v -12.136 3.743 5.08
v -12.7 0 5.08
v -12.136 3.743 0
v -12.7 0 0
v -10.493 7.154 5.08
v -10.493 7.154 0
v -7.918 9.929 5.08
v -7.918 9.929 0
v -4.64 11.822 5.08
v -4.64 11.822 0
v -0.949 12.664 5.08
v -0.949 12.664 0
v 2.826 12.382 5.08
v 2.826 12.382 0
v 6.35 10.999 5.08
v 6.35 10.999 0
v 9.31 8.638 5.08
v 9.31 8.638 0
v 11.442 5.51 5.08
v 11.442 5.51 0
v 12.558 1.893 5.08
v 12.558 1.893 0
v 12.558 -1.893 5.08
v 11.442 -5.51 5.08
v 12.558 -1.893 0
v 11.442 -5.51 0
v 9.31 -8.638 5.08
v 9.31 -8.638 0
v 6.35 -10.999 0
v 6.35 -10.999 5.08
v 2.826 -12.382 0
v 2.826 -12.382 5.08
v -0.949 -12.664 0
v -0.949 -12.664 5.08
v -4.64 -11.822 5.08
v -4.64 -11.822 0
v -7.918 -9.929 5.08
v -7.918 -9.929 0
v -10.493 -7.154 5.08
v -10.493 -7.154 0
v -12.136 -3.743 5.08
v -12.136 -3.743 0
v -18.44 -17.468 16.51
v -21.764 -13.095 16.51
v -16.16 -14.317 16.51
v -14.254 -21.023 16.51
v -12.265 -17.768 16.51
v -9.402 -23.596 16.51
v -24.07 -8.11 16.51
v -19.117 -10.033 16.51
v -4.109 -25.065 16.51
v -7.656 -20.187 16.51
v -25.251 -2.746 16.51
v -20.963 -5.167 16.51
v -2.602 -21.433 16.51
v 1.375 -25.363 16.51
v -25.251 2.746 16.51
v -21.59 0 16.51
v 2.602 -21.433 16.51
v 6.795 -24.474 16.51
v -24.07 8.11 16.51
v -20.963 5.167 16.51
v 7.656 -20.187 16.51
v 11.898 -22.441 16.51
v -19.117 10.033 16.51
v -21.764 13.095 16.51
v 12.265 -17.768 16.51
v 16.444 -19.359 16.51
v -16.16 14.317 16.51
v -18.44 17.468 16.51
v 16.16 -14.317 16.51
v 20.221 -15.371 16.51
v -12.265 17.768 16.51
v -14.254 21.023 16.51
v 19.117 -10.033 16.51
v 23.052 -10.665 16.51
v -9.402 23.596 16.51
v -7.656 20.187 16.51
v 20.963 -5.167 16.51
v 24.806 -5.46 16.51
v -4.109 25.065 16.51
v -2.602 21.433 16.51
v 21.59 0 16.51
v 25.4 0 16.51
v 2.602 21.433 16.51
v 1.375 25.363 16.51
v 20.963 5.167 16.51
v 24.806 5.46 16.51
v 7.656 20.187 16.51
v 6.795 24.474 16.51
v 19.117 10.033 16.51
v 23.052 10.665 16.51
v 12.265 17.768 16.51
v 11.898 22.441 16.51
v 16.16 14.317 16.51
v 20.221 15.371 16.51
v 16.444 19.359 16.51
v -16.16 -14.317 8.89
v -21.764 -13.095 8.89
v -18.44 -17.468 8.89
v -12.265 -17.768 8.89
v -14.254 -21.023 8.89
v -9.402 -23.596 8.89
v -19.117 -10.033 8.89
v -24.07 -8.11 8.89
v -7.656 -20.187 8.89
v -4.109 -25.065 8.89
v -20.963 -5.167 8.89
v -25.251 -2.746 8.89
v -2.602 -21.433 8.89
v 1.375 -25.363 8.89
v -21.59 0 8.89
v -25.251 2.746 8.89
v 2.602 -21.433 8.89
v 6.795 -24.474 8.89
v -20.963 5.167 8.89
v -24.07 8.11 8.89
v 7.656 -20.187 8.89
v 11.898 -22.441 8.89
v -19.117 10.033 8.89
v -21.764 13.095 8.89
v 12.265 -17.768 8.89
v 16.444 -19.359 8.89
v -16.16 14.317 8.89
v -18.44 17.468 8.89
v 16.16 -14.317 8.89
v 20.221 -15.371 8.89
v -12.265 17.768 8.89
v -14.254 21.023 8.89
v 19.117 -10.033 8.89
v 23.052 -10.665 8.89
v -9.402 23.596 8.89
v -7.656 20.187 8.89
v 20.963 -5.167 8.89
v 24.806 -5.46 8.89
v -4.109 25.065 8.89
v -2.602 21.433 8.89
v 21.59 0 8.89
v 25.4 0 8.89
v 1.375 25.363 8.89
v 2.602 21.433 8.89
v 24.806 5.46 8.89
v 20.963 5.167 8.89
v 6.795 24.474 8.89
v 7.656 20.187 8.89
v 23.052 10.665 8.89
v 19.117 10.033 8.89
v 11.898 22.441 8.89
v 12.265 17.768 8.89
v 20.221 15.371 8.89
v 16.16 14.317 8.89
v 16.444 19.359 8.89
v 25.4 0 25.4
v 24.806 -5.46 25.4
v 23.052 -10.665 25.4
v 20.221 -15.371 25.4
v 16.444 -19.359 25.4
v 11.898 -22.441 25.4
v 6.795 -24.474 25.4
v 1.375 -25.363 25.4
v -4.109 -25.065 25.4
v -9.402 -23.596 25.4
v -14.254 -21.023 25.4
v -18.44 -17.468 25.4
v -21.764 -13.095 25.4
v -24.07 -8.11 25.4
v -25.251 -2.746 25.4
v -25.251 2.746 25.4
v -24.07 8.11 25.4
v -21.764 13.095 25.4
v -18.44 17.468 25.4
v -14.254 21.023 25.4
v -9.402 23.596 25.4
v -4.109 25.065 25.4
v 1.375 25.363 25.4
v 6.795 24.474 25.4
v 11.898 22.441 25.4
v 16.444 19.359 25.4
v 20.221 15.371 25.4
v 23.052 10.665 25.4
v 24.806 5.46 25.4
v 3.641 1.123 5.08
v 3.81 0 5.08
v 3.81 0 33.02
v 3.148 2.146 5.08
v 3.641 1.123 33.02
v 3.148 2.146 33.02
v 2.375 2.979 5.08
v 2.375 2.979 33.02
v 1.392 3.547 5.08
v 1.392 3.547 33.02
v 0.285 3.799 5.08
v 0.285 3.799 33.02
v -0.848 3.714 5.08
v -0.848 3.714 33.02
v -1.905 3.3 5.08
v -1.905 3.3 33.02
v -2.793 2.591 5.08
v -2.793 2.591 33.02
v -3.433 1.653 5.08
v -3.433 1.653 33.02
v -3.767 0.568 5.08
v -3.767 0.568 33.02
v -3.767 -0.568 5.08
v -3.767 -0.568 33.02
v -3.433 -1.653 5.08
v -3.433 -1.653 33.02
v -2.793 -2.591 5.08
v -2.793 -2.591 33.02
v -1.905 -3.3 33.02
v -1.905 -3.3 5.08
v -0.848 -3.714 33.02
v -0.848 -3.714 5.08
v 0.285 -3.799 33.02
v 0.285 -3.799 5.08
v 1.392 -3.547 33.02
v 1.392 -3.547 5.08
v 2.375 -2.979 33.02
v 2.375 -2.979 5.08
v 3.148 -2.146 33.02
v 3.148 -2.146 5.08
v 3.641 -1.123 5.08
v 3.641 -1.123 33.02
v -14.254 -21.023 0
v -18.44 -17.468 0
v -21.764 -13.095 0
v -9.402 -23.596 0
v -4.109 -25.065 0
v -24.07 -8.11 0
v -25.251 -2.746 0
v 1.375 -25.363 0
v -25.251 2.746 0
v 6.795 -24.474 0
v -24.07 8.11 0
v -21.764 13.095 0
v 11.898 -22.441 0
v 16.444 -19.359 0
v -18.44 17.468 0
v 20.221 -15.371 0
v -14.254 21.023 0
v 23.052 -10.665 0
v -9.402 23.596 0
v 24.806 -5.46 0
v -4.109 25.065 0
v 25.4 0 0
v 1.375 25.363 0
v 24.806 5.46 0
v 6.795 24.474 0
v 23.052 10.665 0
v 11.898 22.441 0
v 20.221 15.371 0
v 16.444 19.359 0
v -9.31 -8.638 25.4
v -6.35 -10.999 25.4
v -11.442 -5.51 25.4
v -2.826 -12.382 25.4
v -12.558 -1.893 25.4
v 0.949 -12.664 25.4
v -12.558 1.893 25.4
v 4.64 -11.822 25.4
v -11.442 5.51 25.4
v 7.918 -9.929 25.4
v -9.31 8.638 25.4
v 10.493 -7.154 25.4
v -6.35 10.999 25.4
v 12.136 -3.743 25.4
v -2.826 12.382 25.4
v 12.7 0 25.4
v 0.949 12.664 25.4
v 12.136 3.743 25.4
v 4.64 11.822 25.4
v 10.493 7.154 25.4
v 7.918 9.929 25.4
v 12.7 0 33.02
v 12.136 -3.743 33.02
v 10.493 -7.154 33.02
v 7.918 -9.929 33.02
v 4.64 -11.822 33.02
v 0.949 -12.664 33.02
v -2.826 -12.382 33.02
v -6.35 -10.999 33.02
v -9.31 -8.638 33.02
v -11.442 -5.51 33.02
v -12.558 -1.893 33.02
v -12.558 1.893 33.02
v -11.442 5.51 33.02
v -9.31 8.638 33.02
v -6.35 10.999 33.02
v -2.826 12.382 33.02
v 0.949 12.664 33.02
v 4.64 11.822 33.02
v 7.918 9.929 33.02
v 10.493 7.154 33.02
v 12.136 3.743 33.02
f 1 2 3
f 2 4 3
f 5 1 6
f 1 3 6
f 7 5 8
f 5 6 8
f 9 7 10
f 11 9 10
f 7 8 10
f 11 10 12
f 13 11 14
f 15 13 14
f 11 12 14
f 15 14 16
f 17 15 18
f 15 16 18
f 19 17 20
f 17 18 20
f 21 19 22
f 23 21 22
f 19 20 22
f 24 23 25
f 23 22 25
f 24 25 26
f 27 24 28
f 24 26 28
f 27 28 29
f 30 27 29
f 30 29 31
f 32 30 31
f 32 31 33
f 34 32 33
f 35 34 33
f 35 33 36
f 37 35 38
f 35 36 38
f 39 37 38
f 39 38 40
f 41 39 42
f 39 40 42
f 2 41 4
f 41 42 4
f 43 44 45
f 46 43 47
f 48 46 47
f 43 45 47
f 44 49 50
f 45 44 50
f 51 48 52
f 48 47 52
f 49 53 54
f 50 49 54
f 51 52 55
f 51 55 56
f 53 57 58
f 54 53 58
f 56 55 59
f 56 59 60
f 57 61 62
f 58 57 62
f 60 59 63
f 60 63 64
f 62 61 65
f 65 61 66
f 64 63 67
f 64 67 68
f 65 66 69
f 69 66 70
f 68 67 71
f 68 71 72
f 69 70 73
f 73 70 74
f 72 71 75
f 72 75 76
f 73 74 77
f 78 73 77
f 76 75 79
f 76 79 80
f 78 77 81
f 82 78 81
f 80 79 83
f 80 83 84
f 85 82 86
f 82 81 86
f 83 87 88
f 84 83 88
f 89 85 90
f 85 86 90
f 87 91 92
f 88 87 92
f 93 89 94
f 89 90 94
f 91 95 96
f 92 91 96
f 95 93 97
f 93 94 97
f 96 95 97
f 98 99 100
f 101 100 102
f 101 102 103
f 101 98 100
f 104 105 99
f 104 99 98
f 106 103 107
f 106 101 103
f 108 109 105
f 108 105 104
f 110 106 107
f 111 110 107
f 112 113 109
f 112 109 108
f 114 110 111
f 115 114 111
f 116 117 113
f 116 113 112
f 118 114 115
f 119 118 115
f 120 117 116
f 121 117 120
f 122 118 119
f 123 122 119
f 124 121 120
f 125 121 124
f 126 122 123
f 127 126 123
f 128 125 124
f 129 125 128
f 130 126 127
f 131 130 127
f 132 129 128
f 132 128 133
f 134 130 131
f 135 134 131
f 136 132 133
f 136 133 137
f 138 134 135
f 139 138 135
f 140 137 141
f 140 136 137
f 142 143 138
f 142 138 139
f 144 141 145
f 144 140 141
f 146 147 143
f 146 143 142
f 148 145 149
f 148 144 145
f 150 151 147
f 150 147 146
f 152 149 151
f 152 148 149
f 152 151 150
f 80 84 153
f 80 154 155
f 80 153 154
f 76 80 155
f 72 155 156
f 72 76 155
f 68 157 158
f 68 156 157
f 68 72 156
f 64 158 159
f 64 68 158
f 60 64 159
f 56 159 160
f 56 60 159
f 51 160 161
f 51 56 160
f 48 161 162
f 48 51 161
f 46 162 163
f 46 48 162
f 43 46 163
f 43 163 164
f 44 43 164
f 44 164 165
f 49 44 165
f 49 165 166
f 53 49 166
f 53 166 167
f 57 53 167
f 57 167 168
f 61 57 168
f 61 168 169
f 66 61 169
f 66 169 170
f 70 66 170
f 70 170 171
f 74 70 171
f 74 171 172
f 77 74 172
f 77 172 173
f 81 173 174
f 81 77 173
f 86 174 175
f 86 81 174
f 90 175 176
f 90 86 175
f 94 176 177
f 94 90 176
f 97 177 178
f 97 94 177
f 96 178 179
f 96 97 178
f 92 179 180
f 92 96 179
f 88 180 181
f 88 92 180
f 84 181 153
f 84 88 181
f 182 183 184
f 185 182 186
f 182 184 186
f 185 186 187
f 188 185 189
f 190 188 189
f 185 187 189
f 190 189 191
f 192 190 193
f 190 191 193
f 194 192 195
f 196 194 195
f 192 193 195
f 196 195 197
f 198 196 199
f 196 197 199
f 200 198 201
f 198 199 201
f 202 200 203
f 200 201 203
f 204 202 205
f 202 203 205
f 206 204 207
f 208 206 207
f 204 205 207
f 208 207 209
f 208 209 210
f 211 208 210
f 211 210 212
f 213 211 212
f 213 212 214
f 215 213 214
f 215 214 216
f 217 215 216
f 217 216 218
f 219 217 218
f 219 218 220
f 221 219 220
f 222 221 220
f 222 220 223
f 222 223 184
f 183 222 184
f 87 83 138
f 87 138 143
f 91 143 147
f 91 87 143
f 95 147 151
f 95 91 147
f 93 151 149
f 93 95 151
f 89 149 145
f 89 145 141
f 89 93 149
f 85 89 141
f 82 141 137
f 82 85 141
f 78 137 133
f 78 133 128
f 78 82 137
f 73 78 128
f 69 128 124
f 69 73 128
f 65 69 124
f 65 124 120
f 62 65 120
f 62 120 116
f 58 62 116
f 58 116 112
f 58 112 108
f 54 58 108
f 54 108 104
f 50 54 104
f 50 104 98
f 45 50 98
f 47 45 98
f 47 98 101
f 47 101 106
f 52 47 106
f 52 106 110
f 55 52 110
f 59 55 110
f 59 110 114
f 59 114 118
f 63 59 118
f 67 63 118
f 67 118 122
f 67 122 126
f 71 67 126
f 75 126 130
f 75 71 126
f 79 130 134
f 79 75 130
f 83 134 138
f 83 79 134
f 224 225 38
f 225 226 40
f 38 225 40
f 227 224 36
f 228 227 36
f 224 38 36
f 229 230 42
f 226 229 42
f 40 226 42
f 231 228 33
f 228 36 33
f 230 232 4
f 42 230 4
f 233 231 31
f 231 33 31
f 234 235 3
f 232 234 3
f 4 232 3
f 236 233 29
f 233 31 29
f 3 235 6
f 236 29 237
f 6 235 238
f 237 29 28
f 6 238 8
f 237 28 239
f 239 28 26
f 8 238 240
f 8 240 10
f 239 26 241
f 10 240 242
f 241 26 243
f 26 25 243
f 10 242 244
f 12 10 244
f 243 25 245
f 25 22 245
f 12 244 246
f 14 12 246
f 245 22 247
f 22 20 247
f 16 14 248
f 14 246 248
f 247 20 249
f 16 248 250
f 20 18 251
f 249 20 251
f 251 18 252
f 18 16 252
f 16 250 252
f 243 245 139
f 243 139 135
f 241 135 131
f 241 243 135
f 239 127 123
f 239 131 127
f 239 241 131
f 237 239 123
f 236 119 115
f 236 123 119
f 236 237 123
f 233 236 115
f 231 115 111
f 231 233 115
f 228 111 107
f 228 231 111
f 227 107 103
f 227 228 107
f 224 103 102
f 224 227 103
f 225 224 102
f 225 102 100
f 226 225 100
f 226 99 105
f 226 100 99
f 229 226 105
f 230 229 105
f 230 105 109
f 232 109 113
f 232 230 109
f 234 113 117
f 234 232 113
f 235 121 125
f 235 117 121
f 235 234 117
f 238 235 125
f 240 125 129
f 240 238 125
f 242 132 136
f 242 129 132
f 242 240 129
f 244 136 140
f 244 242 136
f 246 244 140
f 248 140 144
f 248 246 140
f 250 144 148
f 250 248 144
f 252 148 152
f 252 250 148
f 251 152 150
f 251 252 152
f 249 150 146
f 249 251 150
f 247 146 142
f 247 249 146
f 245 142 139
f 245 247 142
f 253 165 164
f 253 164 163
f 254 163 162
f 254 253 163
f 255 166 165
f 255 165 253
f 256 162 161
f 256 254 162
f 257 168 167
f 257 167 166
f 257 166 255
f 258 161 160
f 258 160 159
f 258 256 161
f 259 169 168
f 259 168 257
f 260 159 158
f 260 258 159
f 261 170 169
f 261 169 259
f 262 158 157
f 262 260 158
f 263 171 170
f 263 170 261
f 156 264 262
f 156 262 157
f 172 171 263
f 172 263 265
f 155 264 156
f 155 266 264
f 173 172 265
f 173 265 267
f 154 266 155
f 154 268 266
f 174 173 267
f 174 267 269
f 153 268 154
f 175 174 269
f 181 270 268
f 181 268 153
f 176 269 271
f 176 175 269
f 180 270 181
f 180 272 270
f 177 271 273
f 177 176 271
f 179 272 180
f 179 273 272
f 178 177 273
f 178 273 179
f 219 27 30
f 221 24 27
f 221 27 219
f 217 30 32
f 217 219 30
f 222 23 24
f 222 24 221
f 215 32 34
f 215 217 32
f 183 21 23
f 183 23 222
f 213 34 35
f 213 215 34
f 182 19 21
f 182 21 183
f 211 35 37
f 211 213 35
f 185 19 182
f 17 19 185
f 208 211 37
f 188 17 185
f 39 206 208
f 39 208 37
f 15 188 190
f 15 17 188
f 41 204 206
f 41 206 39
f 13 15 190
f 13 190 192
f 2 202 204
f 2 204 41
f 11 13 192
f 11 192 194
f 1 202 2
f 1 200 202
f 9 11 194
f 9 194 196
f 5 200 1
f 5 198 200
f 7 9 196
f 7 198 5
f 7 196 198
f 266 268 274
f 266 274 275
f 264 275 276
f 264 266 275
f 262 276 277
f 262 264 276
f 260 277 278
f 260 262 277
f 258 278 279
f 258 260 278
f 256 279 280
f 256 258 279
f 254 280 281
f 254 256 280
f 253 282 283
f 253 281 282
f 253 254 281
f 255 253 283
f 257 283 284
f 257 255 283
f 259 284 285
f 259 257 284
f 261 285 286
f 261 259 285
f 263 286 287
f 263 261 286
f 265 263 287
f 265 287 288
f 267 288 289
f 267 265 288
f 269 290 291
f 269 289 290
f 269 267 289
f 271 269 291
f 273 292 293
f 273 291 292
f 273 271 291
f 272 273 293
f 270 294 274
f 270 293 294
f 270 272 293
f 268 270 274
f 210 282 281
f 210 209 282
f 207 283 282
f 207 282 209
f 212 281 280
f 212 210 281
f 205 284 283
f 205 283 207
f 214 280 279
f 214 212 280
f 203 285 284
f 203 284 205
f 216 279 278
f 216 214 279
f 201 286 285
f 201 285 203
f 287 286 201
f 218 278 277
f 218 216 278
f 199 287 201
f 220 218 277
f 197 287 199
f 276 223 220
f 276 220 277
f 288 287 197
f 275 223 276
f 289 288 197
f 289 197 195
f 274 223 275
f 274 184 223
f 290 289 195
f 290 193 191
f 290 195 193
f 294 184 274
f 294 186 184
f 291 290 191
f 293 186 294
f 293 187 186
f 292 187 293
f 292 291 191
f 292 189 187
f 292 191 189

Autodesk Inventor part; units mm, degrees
ref_plane "YZ Plane" through (0, 0, 0) normal (1, 0, 0) x (0, 1, 0)
ref_plane "XZ Plane" through (0, 0, 0) normal (0, 1, 0) x (-1, 0, 0)
sketch "Sketch1" plane through (0, 0, 0) normal (0, 0, 1) x (1, 0, 0)
  circle A0 centre (0, 0) radius 25.4
  dimension "d0" = 50.8
extrude "Extrusion1" add sketch "Sketch1" along normal blind 25.4
sketch "Sketch2" plane through (0, 0, 0) normal (0, 0, 1) x (1, 0, 0)
  point P0 (0, 0)
ref_plane "Work Plane1" through (0, 0, 12.7) normal (0, 0, 1) x (1, 0, 0)
sketch "Sketch4" plane through (0, 0, 12.7) normal (0, 0, 1) x (1, 0, 0)
  circle A0 centre (0, 0) radius 25.4
  circle A1 centre (0, 0) radius 21.59
  dimension "d7" = 50.8
  dimension "d8" = 43.18
extrude "Extrusion3" cut sketch "Sketch4" along normal mid plane 7.62
sketch "Sketch5" plane through (0, 0, 25.4) normal (0, 0, 1) x (1, 0, 0)
  circle A0 centre (0, 0) radius 12.7
  dimension "d11" = 25.4
extrude "Extrusion4" cut sketch "Sketch5" against normal blind 5.08
sketch "Sketch6" plane through (0, 0, 0) normal (0, 0, -1) x (-1, 0, 0)
  circle A0 centre (0, 0) radius 12.7
  dimension "d14" = 25.4
extrude "Extrusion5" cut sketch "Sketch6" against normal blind 5.08
sketch "Sketch7" plane through (0, 0, 20.32) normal (0, 0, 1) x (1, 0, 0)
  circle A0 centre (0, 0) radius 3.81
  dimension "d17" = 7.62
extrude "Extrusion6" cut sketch "Sketch7" along normal mid plane 127
sketch "Sketch8" plane through (0, 0, 20.32) normal (0, 0, 1) x (1, 0, 0)
  circle A0 centre (0, 0) radius 12.7
extrude "Extrusion7" add sketch "Sketch8" along normal blind 12.7
sketch "Sketch9" plane through (0, 0, 33.02) normal (0, 0, 1) x (1, 0, 0)
  circle A0 centre (0, 0) radius 3.81
  dimension "d22" = 7.62
extrude "Extrusion8" cut sketch "Sketch9" against normal blind 25.4
properties part number "Pulley"
